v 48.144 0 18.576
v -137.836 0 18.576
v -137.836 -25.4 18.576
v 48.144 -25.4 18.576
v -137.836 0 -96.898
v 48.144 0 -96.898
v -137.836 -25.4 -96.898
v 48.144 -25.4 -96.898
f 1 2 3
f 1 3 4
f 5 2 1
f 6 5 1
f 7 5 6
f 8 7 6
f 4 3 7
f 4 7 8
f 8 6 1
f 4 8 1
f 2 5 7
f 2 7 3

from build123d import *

# Parameters (mm, degrees)
F0_W     = 99.2550253868
F0_H     = 95.004145056
F1_DEPTH = 25.4
F3_W     = 185.97952649
F3_H     = 115.4745575041
F4_DEPTH = 25.4


with BuildPart() as f1:
    # F0 (on Front) → F1 (new body)
    with BuildSketch(Plane.XZ):
        with Locations((-80.9538513422, 2.1863337606)):
            Rectangle(F0_W, F0_H)
    extrude(amount=F1_DEPTH)


with BuildPart() as f4:
    # F3 (on Front) → F4 (new body)
    with BuildSketch(Plane.XZ):
        with Locations((-44.8461268097, -39.1611577943)):
            Rectangle(F3_W, F3_H)
    extrude(amount=F4_DEPTH)


solid = f4.part
